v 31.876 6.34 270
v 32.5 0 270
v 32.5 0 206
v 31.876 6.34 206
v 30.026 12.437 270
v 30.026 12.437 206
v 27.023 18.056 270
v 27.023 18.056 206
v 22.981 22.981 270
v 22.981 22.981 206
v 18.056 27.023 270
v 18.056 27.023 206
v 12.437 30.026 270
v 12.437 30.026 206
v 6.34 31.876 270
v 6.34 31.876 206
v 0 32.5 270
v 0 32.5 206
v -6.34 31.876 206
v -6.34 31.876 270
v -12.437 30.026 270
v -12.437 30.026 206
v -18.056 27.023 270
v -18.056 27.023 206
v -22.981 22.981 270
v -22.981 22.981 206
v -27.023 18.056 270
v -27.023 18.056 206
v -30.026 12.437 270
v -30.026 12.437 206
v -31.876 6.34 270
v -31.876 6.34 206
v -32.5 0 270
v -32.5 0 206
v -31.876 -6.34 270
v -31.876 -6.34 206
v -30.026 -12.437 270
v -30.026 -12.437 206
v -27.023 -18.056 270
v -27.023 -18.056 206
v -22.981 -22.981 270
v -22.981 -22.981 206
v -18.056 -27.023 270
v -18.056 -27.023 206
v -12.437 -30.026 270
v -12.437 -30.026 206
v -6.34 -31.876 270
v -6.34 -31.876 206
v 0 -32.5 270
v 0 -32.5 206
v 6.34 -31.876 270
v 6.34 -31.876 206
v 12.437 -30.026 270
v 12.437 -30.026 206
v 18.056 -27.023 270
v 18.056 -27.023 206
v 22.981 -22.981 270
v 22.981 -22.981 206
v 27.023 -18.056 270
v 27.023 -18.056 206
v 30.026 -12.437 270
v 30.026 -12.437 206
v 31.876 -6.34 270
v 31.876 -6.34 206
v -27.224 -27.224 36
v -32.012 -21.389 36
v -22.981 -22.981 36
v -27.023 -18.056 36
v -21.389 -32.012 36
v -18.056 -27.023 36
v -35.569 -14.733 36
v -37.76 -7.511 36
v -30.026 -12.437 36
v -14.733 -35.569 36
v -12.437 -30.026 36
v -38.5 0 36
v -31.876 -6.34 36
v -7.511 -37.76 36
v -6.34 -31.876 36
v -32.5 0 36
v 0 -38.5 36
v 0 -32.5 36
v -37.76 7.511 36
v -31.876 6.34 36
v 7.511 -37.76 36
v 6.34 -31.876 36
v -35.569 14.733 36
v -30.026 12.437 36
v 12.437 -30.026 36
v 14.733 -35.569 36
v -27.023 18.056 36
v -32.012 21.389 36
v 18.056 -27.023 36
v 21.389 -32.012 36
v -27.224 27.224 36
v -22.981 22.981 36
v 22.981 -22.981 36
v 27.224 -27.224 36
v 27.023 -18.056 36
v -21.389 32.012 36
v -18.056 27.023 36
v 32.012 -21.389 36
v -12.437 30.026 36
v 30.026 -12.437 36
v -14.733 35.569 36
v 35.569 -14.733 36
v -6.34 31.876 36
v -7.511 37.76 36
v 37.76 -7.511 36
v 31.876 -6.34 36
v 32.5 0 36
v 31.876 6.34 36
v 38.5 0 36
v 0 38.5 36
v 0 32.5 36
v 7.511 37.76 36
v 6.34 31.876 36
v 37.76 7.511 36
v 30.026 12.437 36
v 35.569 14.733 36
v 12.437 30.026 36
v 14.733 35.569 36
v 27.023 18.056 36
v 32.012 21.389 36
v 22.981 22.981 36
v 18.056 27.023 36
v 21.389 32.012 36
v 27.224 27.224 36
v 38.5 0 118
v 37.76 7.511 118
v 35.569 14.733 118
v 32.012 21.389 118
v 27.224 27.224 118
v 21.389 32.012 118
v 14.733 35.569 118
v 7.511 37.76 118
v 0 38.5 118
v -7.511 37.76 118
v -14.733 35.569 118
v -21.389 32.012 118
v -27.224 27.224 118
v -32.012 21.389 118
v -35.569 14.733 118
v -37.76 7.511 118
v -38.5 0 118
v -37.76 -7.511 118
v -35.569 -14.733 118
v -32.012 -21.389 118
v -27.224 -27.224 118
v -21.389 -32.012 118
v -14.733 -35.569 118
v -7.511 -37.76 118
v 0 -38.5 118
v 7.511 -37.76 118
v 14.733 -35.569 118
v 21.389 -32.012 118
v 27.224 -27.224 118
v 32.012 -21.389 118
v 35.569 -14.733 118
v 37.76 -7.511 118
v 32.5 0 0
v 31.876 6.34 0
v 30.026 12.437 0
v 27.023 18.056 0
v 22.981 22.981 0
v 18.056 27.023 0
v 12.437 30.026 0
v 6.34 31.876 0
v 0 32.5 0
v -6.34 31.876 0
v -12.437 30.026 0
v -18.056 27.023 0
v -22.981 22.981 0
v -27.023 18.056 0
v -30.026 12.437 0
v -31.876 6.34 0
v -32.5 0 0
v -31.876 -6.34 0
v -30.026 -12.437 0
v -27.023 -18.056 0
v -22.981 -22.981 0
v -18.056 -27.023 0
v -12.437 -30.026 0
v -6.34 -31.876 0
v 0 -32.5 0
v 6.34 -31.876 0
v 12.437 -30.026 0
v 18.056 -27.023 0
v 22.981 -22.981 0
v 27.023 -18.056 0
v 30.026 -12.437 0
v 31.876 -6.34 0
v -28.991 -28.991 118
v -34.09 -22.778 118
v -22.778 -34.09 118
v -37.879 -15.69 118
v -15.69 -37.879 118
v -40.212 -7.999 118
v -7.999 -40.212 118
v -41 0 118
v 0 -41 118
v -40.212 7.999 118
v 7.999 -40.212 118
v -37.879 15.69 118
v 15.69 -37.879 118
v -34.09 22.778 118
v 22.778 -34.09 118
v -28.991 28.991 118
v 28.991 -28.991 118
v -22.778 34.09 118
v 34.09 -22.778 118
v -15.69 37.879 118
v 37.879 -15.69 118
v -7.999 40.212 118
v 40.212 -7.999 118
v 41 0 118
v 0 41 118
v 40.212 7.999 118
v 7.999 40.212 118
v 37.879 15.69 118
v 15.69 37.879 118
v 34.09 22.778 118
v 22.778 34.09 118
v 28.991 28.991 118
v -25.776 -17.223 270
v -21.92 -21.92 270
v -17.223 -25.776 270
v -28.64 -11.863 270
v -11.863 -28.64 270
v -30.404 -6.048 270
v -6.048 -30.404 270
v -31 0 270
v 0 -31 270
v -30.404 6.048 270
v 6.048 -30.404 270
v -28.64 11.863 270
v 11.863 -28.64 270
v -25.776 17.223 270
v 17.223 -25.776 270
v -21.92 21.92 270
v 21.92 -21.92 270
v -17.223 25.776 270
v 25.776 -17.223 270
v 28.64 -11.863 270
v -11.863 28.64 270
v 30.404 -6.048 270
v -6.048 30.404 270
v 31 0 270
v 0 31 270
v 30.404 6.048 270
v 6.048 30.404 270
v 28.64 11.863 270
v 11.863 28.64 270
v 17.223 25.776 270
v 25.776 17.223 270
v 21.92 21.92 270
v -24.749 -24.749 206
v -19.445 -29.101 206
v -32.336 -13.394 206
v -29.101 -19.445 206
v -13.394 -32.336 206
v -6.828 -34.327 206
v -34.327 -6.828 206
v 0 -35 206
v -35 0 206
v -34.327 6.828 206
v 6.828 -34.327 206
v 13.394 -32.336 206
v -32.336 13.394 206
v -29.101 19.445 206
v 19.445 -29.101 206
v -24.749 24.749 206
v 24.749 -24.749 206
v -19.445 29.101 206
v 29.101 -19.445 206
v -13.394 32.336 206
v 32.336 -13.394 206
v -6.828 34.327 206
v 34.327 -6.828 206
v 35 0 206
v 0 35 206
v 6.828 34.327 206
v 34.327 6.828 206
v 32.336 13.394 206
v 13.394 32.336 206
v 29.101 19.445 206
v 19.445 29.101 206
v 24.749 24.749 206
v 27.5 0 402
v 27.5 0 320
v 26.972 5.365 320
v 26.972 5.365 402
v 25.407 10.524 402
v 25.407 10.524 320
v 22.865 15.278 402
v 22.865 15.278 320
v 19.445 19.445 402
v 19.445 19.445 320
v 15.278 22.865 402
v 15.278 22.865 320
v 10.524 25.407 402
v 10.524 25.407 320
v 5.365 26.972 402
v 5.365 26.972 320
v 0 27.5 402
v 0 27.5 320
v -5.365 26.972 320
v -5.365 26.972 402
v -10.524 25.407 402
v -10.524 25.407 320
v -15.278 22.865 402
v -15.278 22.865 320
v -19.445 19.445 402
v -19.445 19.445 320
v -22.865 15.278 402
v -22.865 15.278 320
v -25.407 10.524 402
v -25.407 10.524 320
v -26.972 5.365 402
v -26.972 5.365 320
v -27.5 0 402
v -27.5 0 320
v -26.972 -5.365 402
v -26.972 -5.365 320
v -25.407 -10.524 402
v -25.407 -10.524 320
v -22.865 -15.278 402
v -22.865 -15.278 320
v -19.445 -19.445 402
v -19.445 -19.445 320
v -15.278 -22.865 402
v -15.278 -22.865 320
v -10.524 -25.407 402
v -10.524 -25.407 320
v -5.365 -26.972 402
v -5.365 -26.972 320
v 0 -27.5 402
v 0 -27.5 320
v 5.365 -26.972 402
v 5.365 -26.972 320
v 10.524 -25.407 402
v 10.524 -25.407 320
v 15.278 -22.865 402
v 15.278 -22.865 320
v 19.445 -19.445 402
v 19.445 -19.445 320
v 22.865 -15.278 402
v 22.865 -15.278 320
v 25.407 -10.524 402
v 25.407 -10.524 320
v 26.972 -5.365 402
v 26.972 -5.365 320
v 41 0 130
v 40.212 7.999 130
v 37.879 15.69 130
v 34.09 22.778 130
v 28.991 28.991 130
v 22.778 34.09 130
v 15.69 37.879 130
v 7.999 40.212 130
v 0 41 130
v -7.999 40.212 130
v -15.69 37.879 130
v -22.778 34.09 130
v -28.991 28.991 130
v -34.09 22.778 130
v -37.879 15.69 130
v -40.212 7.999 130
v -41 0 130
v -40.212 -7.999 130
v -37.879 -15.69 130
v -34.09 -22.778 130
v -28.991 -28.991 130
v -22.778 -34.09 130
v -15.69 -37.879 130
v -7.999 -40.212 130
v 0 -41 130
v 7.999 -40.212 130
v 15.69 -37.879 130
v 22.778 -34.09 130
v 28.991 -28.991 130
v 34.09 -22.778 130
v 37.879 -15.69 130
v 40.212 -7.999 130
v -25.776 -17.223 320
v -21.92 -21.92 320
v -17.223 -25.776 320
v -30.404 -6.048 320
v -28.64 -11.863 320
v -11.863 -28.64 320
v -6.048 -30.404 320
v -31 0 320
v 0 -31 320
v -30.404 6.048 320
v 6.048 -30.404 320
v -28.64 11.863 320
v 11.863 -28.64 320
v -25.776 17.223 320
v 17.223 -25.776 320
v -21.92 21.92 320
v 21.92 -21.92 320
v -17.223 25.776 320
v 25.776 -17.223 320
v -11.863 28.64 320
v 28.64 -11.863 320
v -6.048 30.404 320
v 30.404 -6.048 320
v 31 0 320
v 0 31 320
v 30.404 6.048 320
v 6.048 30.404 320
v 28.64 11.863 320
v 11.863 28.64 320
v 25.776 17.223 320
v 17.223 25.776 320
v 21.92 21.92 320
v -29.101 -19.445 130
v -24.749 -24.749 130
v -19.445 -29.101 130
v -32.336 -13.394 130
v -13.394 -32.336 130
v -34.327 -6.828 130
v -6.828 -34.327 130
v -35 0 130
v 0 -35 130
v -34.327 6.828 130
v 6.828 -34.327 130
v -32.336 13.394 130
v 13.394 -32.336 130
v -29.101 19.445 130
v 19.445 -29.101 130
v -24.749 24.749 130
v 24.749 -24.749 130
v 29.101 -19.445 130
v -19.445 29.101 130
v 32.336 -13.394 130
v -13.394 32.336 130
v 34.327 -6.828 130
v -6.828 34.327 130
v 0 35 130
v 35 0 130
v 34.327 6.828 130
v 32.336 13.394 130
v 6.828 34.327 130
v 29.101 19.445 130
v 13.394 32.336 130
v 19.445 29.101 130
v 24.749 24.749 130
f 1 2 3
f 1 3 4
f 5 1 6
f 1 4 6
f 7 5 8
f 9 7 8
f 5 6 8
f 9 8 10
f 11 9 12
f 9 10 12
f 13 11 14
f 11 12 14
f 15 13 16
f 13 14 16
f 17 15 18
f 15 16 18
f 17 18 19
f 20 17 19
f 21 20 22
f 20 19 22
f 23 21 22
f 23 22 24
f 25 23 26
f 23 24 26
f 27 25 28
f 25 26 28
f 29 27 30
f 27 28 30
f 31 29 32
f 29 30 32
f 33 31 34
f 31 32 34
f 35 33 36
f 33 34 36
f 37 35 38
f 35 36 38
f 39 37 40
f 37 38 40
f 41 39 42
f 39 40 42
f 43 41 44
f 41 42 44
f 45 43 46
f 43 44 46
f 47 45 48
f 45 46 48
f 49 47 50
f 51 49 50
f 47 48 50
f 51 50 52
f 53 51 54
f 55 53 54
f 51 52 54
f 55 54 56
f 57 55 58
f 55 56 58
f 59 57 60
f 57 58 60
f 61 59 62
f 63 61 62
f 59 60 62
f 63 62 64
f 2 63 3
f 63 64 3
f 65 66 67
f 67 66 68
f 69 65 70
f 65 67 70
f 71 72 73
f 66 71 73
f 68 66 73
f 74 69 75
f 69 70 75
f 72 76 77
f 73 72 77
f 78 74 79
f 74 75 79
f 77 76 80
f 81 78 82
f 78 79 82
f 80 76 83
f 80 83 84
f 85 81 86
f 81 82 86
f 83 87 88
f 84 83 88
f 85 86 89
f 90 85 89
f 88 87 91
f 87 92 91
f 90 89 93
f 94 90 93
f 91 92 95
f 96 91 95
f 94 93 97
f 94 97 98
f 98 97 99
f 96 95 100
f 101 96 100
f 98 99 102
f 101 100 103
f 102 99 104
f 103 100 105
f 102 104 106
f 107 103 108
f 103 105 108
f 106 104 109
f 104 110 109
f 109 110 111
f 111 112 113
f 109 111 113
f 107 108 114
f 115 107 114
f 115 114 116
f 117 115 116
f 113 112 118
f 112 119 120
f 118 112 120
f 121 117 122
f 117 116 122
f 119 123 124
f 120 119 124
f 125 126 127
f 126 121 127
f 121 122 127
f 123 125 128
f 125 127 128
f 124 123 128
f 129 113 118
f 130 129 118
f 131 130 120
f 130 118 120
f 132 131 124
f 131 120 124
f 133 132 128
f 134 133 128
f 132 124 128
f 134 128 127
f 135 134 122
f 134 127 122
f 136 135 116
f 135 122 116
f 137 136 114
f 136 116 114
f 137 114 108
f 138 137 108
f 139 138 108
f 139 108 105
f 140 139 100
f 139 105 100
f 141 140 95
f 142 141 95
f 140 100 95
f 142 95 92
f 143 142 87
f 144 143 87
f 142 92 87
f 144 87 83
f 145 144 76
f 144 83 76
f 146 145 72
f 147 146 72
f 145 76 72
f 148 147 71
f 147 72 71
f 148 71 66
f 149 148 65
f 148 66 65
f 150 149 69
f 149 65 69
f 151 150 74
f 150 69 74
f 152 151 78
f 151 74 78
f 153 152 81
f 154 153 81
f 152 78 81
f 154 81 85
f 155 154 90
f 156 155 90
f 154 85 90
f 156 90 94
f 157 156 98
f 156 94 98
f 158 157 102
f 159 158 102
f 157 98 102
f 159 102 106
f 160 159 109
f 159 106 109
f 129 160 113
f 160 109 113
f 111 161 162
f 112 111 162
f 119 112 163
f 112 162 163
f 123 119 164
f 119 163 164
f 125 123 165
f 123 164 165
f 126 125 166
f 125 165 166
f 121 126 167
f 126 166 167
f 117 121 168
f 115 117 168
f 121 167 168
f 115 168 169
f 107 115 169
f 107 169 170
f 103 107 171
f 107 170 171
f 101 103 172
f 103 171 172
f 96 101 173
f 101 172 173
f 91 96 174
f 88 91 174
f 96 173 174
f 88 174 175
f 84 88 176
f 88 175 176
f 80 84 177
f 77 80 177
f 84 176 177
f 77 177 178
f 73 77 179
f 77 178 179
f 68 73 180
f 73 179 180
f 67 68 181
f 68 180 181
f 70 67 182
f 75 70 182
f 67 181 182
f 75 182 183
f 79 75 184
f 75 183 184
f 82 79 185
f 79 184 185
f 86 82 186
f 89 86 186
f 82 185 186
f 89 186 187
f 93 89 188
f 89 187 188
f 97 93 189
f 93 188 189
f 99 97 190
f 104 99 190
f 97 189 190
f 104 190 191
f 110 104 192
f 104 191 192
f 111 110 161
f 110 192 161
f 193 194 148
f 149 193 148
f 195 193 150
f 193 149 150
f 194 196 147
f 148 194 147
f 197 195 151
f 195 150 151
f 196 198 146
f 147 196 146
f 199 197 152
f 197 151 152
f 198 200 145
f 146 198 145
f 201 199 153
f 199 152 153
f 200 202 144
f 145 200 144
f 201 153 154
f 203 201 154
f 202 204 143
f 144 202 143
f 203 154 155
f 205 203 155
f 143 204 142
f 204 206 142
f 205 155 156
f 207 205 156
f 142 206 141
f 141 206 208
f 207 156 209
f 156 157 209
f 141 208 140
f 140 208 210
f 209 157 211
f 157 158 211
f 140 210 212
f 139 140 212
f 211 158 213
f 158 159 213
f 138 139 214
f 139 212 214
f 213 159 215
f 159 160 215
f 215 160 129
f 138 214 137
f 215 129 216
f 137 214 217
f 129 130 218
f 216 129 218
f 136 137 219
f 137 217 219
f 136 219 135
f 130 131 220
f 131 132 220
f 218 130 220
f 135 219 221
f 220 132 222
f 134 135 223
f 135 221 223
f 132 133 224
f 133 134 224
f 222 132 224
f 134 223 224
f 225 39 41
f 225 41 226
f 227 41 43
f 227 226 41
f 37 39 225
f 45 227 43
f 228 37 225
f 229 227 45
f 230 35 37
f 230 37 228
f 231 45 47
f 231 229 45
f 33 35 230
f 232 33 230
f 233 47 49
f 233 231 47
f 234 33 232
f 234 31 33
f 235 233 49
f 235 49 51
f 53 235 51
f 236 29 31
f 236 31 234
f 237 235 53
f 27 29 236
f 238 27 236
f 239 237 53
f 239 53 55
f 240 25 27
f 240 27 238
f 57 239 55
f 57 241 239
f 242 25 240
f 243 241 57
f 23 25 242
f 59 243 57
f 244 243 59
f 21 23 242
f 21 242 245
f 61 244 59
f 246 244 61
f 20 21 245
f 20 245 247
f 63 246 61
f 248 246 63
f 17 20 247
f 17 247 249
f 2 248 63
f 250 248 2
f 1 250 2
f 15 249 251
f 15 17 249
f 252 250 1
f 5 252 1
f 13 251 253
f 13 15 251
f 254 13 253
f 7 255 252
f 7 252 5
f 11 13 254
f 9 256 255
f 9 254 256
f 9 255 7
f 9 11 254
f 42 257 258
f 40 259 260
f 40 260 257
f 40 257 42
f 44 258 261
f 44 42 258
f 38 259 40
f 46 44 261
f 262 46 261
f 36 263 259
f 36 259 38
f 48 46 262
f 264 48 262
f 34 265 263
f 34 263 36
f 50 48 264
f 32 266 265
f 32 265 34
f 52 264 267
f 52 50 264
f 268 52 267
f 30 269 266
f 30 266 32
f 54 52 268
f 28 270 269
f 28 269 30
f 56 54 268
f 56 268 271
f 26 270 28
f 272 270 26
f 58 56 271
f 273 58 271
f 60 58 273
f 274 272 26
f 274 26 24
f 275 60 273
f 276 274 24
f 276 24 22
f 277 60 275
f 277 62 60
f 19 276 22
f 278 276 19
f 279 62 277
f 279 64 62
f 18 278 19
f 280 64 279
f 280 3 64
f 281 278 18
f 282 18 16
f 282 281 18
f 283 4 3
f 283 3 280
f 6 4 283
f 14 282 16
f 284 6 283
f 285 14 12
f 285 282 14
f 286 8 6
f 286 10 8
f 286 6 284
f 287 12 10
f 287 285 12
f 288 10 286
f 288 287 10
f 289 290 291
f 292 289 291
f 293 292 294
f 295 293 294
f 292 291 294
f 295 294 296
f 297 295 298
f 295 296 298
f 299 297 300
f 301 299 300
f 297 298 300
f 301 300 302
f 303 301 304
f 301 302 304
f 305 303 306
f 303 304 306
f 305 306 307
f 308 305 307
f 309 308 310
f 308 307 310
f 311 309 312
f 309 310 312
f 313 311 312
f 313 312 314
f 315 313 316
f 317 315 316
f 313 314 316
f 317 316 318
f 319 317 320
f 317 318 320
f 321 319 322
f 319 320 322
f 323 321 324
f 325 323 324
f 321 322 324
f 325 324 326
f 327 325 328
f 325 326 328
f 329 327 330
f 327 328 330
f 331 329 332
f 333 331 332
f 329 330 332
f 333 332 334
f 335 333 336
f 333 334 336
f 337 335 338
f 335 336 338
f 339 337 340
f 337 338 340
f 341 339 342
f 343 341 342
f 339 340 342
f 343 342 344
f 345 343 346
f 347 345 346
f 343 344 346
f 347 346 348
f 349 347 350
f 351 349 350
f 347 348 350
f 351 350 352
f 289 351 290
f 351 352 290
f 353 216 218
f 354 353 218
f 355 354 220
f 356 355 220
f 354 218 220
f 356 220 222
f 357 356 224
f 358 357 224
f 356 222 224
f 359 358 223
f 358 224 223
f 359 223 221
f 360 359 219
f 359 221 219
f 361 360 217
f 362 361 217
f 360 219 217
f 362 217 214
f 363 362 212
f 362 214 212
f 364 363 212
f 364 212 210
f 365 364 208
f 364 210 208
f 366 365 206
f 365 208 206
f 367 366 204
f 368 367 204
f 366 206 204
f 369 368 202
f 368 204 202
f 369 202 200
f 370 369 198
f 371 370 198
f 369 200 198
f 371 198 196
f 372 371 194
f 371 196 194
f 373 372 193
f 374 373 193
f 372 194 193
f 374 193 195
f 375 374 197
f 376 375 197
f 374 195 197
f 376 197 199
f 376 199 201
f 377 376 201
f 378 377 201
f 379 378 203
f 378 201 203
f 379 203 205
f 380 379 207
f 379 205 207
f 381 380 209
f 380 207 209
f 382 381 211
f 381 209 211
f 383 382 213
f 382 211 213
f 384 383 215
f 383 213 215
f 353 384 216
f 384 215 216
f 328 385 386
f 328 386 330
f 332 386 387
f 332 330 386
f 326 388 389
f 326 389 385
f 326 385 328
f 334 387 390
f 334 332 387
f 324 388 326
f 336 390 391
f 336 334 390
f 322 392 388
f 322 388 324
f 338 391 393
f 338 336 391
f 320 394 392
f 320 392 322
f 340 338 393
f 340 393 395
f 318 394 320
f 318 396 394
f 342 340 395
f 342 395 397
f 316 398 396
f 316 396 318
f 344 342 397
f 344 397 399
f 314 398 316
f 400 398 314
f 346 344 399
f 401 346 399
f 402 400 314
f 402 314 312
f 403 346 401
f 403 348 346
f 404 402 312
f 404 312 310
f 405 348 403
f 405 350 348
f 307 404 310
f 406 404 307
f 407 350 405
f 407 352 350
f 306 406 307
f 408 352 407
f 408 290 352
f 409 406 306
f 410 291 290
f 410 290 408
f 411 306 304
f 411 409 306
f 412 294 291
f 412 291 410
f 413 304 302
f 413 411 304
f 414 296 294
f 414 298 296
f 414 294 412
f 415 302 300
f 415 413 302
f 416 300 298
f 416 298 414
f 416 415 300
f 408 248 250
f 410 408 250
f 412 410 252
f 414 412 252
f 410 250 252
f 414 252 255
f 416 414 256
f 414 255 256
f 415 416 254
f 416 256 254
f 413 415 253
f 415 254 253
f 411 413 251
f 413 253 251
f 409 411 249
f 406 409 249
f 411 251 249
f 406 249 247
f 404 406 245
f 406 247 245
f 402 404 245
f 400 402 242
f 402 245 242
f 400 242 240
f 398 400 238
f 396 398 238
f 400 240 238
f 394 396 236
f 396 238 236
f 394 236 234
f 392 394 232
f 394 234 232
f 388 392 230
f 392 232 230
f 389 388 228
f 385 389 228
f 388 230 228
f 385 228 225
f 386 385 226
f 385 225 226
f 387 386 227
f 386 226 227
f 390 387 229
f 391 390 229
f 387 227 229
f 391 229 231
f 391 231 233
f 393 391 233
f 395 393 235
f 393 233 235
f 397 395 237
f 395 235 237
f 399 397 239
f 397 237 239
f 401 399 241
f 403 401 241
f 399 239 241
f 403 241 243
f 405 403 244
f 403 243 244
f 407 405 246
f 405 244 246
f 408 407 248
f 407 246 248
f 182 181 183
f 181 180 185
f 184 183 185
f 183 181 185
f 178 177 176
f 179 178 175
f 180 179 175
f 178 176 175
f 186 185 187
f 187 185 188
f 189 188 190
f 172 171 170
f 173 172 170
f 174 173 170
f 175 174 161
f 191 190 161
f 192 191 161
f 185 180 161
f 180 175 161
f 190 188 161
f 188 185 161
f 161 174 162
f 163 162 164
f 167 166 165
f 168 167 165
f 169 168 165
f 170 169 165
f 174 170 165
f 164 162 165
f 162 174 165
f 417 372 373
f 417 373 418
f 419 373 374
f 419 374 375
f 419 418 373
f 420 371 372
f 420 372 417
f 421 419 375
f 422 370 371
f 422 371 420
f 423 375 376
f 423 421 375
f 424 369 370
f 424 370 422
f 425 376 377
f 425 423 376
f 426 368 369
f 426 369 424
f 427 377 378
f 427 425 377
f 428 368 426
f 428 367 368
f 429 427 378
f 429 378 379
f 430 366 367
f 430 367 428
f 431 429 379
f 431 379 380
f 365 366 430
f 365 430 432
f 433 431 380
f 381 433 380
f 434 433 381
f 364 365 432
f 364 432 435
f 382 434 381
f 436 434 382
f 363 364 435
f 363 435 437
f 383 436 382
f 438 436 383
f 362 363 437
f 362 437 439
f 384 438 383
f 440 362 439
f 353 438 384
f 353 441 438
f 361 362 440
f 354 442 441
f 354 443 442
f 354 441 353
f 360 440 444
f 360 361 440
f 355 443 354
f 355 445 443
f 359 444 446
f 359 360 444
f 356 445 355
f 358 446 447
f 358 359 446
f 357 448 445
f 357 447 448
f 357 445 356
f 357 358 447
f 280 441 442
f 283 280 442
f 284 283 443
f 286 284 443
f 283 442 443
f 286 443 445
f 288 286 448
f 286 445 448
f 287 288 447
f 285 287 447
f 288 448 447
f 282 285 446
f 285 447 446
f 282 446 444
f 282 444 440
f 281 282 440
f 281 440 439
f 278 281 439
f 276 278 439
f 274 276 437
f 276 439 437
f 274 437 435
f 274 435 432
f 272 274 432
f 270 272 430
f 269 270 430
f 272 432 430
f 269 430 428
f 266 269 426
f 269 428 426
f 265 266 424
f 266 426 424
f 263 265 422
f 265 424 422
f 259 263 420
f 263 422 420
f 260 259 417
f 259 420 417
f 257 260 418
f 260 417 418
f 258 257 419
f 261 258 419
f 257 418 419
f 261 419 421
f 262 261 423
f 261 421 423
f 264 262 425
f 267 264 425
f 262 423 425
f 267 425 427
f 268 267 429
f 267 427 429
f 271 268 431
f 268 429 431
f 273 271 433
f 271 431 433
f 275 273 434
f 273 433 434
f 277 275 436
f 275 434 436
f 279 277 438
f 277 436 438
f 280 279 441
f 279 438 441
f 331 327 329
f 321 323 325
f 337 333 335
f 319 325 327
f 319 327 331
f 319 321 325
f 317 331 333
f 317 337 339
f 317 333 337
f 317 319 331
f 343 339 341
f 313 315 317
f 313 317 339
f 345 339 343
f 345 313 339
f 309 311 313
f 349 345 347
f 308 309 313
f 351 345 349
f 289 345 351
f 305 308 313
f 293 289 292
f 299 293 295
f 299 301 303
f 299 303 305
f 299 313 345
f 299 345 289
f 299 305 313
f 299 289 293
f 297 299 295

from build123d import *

# Parameters (mm, degrees)
SKETCH_1_R      = 32.5
EXTRUDE_1_DEPTH = 36
SKETCH_2_R      = 38.5
EXTRUDE_2_DEPTH = 82
SKETCH_3_R      = 41
EXTRUDE_3_DEPTH = 12
SKETCH_4_R      = 35
EXTRUDE_4_DEPTH = 76
SKETCH_5_R      = 32.5
EXTRUDE_5_DEPTH = 64
SKETCH_6_R      = 31
EXTRUDE_6_DEPTH = 50
SKETCH_7_R      = 27.5
EXTRUDE_7_DEPTH = 82


with BuildPart() as part:
    # 草图1 → 凸台-拉伸1 (new body)
    with BuildSketch(Plane.XY):
        Circle(SKETCH_1_R)
    extrude(amount=EXTRUDE_1_DEPTH)

    # 草图2 → 凸台-拉伸2 (add)
    with BuildSketch(Plane.XY.offset(36)):
        Circle(SKETCH_2_R)
    extrude(amount=EXTRUDE_2_DEPTH)

    # 草图3 → 凸台-拉伸3 (add)
    with BuildSketch(Plane.XY.offset(118)):
        Circle(SKETCH_3_R)
    extrude(amount=EXTRUDE_3_DEPTH)

    # 草图4 → 凸台-拉伸4 (add)
    with BuildSketch(Plane.XY.offset(130)):
        Circle(SKETCH_4_R)
    extrude(amount=EXTRUDE_4_DEPTH)

    # 草图5 → 凸台-拉伸5 (add)
    with BuildSketch(Plane.XY.offset(206)):
        Circle(SKETCH_5_R)
    extrude(amount=EXTRUDE_5_DEPTH)

    # 草图6 → 凸台-拉伸6 (add)
    with BuildSketch(Plane.XY.offset(270)):
        Circle(SKETCH_6_R)
    extrude(amount=EXTRUDE_6_DEPTH)

    # 草图7 → 凸台-拉伸7 (add)
    with BuildSketch(Plane.XY.offset(320)):
        Circle(SKETCH_7_R)
    extrude(amount=EXTRUDE_7_DEPTH)


solid = part.part
